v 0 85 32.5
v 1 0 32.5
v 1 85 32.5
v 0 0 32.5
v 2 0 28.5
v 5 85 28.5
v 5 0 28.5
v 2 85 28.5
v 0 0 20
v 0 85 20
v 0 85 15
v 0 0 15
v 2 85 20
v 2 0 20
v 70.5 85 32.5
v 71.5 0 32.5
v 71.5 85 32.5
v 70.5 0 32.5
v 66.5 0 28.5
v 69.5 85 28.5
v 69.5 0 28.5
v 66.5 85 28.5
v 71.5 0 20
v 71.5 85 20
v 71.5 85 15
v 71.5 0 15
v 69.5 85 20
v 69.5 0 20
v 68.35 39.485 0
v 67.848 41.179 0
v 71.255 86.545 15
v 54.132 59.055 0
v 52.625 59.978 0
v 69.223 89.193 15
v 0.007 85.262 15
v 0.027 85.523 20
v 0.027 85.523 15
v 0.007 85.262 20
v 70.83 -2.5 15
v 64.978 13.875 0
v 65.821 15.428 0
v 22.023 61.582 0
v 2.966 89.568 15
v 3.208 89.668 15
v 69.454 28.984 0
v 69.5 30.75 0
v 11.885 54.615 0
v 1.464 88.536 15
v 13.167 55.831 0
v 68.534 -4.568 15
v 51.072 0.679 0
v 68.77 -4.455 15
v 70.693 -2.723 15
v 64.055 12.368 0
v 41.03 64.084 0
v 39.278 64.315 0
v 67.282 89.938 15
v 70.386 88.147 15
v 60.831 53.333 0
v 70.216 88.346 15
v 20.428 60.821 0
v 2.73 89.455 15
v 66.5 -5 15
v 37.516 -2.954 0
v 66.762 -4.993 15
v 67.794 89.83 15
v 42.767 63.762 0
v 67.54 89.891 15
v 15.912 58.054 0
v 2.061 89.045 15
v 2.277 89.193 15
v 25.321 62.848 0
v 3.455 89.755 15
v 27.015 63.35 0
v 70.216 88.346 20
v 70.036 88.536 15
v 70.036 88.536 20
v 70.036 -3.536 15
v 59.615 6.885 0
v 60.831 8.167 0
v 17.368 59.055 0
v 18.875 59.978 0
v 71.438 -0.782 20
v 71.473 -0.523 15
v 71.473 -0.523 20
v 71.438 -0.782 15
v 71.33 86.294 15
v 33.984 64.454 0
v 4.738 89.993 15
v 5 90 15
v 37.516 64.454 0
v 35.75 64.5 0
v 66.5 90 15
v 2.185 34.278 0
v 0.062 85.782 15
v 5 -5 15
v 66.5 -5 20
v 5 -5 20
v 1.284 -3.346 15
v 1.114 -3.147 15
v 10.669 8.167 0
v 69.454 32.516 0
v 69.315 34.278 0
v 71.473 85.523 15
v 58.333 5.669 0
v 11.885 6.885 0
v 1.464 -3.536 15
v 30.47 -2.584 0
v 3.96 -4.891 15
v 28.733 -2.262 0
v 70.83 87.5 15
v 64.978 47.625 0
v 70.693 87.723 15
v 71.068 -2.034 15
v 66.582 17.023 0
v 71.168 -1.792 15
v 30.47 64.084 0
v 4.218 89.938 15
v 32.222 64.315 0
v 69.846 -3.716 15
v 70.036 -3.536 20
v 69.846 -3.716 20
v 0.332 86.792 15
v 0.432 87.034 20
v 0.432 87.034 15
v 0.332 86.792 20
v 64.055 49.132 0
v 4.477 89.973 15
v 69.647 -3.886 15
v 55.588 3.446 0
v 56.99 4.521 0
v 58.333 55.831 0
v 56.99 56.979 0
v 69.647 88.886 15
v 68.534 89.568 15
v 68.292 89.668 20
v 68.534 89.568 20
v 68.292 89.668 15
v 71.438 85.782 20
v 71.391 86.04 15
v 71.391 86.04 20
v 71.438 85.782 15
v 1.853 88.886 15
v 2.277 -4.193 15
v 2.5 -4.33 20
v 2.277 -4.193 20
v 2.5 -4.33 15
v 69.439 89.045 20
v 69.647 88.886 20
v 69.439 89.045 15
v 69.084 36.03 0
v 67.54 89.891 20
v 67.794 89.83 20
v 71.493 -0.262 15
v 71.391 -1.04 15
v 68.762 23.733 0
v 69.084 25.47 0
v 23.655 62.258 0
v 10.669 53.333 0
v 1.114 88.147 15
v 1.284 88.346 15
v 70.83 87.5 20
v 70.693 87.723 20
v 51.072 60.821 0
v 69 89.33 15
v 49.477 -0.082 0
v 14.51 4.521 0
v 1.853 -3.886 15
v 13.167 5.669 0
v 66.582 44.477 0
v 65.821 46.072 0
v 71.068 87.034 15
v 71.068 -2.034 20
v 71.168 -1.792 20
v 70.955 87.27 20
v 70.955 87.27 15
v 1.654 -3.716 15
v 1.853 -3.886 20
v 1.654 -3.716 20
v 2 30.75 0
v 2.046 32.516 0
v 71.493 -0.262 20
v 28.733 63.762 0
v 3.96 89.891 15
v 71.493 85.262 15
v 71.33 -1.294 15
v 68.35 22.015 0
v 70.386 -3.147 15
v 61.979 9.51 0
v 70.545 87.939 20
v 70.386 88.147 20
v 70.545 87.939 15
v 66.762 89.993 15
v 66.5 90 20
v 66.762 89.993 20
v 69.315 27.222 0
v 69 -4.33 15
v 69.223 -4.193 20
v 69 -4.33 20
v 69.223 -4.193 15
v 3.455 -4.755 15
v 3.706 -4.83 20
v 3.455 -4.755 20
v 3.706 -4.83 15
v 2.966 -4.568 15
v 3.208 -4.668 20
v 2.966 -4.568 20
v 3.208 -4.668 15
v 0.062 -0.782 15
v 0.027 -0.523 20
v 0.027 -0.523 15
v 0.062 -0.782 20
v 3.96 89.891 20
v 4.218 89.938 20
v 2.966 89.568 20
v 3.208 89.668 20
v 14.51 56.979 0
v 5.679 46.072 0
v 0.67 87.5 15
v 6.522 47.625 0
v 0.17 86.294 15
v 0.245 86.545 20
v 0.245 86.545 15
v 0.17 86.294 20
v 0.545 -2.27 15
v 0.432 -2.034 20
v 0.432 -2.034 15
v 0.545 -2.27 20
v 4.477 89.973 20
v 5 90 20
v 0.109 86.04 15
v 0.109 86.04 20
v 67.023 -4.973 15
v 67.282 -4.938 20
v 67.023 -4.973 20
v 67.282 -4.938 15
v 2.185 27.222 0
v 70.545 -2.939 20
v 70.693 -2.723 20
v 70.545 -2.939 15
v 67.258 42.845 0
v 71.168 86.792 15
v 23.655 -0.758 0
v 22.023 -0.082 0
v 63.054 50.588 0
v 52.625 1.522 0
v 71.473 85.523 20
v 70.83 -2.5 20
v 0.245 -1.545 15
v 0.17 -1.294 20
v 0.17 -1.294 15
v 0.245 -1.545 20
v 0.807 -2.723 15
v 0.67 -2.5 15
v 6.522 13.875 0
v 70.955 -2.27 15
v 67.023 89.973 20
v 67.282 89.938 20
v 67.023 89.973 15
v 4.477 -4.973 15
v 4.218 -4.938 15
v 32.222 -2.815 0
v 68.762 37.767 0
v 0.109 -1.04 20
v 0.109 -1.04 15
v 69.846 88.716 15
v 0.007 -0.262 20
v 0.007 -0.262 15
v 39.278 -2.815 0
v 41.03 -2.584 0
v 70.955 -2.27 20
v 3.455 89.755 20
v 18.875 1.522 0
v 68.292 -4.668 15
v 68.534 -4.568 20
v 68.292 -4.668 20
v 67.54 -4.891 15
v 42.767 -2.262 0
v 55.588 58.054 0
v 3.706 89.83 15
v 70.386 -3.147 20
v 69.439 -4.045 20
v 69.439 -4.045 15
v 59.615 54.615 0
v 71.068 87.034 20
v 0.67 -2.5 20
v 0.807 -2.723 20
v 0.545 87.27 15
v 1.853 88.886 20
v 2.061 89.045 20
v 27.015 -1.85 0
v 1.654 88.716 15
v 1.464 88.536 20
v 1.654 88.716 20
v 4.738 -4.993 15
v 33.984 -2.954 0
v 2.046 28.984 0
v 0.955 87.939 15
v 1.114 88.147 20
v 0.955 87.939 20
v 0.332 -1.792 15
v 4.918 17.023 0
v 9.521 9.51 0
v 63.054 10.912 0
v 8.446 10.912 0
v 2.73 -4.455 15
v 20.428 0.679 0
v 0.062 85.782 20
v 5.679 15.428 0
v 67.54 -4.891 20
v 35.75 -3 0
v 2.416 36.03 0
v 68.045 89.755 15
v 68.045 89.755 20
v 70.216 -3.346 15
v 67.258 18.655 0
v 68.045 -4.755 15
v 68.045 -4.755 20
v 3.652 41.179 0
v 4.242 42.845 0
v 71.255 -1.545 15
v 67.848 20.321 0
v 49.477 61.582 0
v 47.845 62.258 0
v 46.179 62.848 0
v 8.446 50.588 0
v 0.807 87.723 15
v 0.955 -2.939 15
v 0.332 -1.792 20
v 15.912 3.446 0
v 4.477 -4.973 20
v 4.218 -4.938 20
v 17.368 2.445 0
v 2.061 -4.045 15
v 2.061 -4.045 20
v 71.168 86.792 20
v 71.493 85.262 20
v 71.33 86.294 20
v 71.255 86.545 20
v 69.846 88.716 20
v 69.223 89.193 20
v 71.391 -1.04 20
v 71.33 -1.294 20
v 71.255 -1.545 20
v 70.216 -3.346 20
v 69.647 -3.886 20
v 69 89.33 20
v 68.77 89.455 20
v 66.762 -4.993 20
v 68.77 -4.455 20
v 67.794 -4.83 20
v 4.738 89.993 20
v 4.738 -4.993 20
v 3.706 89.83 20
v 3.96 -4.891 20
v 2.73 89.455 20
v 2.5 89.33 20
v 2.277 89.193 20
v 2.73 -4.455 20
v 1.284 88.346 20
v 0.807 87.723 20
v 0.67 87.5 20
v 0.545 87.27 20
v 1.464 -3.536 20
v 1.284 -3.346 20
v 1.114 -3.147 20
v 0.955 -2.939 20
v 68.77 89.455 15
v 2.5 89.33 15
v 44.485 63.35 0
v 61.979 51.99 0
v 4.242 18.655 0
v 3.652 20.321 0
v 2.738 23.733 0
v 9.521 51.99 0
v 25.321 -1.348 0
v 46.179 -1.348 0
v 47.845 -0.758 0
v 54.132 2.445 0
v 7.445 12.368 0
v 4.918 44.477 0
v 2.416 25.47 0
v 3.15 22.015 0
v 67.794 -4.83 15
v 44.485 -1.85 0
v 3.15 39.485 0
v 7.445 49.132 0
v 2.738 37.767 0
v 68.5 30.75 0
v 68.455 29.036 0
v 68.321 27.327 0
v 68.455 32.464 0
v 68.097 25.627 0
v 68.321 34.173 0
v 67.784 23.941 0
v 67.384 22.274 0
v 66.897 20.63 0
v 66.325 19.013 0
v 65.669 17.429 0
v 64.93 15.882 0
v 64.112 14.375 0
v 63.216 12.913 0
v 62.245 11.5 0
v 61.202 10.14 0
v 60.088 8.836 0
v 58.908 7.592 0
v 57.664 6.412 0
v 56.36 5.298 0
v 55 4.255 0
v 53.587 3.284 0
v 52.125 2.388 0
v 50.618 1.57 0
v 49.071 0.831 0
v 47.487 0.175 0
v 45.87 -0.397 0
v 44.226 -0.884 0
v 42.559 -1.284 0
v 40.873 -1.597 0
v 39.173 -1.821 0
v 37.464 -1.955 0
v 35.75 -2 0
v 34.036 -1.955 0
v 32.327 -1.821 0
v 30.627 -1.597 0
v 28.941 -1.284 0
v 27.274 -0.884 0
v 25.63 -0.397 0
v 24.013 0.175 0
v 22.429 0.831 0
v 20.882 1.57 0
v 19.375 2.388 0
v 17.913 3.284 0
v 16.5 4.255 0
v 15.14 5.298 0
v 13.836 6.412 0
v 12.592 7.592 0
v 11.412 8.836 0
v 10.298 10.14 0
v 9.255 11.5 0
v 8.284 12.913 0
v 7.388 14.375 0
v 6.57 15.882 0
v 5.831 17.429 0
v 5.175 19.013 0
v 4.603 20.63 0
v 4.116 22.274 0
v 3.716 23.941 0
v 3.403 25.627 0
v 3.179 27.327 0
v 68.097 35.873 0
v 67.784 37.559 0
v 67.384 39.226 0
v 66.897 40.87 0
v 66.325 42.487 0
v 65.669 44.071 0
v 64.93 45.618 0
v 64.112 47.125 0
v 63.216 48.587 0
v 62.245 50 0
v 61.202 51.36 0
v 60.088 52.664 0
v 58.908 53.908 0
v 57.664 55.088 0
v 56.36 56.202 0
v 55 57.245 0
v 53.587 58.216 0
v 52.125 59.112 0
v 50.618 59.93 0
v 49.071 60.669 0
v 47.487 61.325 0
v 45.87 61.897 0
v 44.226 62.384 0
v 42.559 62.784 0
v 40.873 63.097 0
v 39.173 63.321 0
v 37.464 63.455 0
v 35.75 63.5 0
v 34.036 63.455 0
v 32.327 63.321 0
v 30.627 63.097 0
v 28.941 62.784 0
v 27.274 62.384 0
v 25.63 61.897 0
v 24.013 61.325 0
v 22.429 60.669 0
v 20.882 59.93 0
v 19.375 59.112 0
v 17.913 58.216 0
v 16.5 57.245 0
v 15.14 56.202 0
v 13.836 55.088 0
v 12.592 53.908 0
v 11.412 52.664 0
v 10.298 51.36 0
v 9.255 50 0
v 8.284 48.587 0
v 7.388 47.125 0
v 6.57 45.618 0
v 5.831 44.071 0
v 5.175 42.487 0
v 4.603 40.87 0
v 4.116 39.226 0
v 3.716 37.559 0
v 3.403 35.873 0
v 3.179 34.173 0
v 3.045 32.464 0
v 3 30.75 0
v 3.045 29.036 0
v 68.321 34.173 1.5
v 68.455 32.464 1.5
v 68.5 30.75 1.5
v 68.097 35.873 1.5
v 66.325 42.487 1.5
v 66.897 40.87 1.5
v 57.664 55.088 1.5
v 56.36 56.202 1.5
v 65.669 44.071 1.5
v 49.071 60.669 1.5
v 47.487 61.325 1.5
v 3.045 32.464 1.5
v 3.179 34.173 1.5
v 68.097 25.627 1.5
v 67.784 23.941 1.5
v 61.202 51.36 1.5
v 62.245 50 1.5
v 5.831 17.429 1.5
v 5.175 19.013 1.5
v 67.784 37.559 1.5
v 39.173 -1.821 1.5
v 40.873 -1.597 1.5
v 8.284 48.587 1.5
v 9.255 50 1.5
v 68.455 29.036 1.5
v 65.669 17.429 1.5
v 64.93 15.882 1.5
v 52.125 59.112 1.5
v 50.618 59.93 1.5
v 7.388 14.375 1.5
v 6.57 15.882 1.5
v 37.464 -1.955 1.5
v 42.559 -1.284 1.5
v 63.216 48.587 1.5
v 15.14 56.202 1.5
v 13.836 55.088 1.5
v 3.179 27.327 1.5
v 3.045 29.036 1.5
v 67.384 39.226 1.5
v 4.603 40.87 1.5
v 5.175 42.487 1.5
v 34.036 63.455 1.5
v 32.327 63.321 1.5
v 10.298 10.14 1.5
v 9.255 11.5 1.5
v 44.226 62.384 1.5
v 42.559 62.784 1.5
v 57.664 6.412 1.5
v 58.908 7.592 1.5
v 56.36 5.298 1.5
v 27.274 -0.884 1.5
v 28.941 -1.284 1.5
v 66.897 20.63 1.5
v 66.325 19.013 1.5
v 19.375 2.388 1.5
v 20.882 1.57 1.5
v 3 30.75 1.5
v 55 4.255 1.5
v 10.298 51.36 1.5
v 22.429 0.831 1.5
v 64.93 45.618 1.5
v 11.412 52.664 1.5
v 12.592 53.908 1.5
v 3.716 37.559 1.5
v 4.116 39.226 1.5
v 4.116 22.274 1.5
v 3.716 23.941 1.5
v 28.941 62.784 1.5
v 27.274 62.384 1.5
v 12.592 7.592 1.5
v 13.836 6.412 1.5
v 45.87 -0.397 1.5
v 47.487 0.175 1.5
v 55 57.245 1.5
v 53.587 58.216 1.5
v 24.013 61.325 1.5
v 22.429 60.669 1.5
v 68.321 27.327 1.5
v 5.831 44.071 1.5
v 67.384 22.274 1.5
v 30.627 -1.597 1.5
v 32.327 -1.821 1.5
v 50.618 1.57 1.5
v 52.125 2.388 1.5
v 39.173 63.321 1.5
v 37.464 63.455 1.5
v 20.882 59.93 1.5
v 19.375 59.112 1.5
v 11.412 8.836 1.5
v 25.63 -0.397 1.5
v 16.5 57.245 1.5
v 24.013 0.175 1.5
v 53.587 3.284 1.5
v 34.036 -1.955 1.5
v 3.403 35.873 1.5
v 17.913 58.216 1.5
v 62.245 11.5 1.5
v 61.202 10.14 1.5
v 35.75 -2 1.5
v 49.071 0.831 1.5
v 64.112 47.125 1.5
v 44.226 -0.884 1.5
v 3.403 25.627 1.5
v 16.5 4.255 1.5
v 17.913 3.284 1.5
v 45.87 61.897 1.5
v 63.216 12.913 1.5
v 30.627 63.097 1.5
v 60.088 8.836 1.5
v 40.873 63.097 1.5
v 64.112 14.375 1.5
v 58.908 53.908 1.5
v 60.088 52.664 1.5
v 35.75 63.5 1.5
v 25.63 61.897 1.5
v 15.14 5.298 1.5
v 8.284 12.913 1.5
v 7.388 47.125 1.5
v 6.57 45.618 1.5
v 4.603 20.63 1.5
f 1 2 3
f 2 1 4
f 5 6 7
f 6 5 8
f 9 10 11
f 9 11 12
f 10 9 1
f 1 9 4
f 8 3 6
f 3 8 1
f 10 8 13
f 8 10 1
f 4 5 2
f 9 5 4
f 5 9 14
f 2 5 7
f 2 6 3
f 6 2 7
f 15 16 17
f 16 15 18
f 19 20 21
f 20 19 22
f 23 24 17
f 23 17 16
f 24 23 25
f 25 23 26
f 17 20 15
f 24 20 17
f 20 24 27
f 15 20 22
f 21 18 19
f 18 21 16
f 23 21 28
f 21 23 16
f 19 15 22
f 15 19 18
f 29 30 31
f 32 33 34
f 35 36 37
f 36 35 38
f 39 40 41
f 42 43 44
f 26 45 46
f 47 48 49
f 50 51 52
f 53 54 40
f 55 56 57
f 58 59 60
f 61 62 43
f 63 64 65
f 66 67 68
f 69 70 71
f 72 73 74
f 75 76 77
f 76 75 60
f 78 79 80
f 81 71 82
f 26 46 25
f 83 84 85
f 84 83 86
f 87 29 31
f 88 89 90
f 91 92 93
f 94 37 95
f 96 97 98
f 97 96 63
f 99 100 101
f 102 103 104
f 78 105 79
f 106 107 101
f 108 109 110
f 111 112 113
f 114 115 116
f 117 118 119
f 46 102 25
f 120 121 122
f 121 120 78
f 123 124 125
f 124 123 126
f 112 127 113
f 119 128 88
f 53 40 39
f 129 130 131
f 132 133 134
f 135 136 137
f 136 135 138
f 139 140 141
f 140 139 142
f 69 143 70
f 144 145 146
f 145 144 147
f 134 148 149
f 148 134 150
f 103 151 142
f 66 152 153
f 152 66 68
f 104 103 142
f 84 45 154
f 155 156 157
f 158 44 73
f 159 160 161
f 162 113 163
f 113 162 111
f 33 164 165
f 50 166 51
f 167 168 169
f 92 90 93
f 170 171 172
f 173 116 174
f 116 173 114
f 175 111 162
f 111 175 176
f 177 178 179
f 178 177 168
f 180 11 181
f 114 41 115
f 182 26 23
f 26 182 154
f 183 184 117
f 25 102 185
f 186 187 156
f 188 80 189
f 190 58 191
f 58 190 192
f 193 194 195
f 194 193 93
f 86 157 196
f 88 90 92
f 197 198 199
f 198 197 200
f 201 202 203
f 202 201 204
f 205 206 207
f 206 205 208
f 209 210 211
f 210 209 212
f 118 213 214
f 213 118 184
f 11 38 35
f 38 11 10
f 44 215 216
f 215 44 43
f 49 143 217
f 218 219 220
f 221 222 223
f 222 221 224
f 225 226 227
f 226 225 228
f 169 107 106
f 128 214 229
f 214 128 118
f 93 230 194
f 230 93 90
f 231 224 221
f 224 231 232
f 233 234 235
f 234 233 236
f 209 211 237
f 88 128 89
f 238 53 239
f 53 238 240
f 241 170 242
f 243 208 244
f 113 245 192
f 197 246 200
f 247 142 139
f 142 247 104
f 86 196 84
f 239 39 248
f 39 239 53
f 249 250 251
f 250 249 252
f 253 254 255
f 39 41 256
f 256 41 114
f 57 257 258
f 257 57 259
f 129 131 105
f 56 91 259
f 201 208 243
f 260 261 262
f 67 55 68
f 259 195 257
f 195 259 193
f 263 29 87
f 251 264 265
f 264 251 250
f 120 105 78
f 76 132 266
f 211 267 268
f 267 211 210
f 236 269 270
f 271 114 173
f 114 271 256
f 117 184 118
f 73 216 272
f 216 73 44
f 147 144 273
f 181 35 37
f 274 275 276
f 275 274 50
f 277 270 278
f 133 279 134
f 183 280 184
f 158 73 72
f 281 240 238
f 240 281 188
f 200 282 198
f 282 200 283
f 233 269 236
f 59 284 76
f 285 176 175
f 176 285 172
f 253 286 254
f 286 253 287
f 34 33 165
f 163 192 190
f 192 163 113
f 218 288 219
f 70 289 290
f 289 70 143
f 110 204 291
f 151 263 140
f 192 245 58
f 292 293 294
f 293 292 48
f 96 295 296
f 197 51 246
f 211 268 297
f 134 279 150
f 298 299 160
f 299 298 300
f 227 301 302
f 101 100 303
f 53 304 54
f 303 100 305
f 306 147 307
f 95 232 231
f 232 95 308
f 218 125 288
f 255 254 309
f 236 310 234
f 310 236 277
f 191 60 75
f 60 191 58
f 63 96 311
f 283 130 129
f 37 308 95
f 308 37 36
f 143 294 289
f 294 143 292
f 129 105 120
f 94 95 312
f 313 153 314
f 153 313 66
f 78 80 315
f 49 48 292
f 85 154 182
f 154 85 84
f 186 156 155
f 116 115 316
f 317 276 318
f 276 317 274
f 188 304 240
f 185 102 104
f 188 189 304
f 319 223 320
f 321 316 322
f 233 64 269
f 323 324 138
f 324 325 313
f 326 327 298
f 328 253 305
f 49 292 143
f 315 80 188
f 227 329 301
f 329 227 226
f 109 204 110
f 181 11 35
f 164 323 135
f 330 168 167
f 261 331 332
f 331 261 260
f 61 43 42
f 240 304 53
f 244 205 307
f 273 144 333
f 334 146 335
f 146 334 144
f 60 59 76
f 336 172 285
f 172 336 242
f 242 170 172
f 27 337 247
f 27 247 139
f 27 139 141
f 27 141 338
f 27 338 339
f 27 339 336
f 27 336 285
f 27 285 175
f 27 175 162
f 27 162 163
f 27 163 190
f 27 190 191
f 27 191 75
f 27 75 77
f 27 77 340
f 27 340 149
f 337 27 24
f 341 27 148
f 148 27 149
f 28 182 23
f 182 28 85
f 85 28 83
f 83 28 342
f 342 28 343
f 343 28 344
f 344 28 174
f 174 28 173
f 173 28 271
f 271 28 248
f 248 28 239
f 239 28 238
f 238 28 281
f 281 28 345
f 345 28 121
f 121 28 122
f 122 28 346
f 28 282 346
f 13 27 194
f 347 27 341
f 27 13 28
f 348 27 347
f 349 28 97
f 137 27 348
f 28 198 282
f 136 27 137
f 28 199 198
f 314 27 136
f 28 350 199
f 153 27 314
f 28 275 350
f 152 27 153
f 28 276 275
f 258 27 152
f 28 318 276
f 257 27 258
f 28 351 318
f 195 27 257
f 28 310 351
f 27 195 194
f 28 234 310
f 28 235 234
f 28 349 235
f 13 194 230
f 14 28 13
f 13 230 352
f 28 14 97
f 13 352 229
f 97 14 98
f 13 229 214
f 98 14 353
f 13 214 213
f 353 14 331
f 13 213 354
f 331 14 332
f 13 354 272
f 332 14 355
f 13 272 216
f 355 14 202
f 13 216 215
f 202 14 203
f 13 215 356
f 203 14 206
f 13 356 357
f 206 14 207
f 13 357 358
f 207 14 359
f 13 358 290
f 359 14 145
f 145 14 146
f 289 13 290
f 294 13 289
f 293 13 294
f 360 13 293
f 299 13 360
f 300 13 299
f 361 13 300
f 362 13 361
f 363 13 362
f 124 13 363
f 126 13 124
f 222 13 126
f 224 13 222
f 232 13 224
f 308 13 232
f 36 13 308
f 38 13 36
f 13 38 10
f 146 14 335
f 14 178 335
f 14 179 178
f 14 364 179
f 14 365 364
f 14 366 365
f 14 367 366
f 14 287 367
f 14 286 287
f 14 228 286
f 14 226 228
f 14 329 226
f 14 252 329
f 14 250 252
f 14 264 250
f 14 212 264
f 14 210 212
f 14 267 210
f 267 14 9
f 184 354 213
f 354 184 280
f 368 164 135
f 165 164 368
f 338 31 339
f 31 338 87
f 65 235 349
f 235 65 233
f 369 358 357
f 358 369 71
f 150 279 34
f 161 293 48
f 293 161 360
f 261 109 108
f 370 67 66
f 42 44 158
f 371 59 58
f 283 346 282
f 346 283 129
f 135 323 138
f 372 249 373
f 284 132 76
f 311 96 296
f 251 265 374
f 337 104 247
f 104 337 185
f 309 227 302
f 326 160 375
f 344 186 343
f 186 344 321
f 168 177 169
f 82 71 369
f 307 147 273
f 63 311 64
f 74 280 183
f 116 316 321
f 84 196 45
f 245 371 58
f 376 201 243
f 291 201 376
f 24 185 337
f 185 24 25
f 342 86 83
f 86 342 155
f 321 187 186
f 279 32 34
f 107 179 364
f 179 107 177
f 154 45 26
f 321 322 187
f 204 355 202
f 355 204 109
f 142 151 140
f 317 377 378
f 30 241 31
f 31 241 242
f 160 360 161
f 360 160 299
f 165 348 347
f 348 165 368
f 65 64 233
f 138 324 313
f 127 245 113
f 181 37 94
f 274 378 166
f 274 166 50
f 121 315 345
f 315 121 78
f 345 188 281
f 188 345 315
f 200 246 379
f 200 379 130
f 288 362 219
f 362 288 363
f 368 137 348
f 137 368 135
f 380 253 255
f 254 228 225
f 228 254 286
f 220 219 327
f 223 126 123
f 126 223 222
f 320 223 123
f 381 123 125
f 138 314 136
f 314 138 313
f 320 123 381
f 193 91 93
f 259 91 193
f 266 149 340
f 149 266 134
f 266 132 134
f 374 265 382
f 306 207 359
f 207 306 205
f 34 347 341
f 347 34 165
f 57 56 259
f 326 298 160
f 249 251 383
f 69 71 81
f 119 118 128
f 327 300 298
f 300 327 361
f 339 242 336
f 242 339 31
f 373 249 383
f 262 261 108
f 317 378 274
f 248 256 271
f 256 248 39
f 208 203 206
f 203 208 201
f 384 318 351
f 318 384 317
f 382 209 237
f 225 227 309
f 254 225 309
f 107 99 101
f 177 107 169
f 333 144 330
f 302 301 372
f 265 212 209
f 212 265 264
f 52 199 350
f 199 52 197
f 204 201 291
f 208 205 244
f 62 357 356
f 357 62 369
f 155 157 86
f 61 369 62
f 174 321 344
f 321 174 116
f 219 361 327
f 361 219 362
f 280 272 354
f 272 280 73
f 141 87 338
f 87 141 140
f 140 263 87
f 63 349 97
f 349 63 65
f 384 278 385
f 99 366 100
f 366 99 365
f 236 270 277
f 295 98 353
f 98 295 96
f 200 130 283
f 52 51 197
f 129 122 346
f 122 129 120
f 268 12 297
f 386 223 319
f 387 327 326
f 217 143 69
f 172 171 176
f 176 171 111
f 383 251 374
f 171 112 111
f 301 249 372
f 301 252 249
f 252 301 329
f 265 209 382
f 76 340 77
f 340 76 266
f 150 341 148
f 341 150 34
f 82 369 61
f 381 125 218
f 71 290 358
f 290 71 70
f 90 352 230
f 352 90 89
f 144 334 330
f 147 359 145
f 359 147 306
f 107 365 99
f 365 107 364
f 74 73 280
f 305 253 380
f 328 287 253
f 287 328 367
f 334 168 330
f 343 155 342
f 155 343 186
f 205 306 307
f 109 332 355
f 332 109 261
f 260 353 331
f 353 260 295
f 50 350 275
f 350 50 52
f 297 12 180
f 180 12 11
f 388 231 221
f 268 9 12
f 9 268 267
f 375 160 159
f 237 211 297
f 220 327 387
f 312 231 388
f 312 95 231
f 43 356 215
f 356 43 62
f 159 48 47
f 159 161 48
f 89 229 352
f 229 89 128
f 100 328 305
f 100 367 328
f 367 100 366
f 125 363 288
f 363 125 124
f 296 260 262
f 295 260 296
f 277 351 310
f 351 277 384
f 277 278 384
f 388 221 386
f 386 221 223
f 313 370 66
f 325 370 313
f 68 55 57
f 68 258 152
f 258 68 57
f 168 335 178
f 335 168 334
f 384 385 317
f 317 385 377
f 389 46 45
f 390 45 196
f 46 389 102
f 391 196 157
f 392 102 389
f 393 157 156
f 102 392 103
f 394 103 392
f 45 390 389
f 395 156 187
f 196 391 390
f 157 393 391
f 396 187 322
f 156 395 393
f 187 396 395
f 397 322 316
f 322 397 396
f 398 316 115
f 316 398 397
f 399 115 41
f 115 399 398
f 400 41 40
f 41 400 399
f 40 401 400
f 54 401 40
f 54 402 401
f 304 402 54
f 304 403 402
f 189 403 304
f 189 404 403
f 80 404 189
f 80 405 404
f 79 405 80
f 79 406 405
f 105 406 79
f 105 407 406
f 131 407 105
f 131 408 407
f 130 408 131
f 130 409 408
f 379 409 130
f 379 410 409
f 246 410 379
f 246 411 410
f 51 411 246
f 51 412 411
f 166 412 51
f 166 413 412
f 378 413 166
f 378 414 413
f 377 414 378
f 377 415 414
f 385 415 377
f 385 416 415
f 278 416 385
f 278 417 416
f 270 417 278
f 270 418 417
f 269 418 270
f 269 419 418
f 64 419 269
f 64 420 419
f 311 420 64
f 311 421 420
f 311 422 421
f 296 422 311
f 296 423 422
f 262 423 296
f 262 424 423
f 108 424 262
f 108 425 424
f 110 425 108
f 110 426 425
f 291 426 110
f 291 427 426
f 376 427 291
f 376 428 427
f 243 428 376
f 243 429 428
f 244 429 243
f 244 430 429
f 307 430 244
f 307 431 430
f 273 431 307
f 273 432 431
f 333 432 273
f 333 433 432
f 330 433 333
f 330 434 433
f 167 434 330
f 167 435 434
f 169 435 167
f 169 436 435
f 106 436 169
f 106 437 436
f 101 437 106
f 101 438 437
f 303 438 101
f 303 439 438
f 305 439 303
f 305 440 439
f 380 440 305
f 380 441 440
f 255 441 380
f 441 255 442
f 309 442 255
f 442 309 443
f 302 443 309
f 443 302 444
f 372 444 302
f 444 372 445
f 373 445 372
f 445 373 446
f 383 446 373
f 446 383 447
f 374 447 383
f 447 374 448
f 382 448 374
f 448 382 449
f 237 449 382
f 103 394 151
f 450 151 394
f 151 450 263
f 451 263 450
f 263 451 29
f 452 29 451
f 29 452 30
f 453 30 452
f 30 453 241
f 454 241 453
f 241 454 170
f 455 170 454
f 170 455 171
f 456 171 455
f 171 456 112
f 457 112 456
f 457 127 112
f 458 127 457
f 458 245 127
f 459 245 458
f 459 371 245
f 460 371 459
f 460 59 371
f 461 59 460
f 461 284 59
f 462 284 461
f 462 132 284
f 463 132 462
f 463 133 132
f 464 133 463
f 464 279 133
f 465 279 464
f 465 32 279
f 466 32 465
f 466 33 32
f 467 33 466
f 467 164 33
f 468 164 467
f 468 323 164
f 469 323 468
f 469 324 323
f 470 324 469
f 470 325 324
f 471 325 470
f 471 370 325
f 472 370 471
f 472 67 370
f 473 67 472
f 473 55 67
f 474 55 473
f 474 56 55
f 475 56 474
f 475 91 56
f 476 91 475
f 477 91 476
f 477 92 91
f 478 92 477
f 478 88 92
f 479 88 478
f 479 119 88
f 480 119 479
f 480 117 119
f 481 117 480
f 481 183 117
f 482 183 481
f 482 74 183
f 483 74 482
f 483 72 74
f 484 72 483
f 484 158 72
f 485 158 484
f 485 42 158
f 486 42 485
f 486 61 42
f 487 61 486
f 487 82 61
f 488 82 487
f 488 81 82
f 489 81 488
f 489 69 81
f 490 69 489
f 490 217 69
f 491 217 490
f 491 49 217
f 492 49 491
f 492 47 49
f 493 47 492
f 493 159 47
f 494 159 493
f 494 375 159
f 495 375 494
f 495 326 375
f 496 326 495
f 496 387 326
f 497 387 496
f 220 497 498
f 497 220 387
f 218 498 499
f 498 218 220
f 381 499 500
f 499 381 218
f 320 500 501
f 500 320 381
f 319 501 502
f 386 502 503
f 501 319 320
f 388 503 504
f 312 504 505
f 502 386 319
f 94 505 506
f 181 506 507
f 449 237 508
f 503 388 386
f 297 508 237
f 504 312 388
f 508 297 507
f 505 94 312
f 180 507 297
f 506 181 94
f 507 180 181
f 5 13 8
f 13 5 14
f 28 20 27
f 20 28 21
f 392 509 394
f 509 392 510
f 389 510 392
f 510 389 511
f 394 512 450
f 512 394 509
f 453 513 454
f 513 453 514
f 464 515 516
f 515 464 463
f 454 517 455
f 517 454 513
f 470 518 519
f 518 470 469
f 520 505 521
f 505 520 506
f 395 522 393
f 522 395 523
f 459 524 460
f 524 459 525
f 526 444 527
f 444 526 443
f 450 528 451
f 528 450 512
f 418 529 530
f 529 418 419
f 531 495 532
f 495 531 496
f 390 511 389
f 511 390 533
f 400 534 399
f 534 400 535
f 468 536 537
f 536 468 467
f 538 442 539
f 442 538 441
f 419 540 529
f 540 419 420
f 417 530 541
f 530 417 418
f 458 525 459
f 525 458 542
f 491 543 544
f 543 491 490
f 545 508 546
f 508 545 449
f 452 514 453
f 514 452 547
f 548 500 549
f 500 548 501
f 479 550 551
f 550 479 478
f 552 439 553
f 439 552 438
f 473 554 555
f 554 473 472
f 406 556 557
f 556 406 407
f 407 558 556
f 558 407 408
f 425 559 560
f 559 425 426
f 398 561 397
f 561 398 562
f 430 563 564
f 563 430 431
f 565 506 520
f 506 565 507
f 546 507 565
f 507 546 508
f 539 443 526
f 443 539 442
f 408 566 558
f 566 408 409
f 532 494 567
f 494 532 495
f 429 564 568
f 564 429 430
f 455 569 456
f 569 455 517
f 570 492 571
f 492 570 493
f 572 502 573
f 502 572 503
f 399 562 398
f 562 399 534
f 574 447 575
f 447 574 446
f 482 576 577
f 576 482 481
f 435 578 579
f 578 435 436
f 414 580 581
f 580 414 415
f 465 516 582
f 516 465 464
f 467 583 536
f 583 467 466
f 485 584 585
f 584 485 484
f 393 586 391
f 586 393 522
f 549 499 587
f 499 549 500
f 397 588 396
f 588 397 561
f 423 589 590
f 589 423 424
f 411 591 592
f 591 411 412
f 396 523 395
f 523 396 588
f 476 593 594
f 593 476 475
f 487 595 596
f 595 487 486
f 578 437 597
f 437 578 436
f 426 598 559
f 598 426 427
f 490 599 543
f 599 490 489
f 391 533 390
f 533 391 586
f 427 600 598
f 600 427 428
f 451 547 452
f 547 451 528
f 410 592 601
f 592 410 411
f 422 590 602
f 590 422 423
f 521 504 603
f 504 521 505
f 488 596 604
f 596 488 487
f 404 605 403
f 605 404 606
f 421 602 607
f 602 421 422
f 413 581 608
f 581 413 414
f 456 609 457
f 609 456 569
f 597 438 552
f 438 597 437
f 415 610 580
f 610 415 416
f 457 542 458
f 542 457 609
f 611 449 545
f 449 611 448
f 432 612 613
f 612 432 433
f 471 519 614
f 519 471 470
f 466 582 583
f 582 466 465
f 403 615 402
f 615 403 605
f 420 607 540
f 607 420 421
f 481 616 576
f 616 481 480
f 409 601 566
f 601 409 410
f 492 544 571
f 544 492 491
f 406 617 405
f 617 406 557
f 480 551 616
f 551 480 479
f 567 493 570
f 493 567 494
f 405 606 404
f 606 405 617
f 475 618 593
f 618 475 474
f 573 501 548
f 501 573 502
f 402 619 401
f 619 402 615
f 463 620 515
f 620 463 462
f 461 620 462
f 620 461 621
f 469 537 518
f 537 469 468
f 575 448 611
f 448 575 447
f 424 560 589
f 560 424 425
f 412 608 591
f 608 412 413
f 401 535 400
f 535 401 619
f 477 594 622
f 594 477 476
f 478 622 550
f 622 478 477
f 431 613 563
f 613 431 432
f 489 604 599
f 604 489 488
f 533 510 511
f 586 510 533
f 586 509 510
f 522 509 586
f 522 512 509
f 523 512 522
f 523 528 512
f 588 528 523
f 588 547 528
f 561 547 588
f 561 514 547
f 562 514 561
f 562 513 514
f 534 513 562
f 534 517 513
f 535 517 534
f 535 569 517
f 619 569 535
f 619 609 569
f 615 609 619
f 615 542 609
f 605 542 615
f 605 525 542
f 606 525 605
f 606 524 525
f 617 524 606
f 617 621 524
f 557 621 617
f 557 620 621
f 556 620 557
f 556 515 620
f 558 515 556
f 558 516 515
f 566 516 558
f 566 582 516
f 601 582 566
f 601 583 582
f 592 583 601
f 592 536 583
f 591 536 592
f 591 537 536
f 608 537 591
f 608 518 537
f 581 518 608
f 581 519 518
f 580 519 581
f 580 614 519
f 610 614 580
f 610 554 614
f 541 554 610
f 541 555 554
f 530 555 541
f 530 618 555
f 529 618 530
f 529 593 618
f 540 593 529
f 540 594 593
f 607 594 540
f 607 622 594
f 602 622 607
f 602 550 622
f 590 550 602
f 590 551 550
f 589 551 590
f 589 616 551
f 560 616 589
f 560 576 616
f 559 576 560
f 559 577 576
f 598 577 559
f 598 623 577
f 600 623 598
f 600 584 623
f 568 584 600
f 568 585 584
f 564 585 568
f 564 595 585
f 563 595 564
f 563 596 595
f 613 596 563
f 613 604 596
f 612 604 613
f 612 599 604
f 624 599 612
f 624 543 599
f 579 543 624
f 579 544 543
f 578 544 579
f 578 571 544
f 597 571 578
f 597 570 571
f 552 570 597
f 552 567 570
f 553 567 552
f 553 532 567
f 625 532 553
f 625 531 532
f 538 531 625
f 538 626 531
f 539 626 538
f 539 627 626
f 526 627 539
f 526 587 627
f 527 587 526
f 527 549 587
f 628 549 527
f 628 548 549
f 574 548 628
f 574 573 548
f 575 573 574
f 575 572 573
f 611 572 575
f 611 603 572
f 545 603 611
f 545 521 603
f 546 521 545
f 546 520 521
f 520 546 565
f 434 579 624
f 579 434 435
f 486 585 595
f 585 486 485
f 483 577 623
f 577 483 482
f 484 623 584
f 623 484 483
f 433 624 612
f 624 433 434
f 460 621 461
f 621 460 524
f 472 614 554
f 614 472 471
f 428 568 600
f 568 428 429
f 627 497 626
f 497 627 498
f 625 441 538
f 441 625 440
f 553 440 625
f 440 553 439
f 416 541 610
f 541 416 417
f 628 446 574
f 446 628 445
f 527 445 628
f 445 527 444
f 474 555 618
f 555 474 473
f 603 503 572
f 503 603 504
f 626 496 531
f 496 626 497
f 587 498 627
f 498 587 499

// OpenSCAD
$fn=120;
metal_x=67.5;
metal_y=85;
metal_z=8.5;

corner=10;

wall=2;
clip=3;
clip_h=4;

total_x=metal_x+wall*2;


h=20;
base_h=5;
hull_h=h-base_h;

felt=2.5*25.4+2;
felt_h=1.5;
felt_wall=1;

pad=0.1;
padd=pad*2;


difference() {
    union() {
        hull() {
            translate([h/4,0,hull_h])
            minkowski() {
                cylinder(h=base_h/2,d=corner);
                cube([total_x-h/2,metal_y,base_h/2]);
            }
            translate([total_x/2,total_x/2-corner/2,0])
            cylinder(d=felt+felt_wall*2,h=hull_h);
        }

        translate([0,0,h])
        cube([wall,metal_y,metal_z]);
        translate([total_x-wall,0,h])
        cube([wall,metal_y,metal_z]);
        clip();
        translate([total_x,0,0])
        mirror([1,0,0])
        clip();
    }
    translate([total_x/2,total_x/2-corner/2,-pad])
    cylinder(h=felt_h+pad,d=felt);
}

module clip() {
    difference() {
        translate([0,0,metal_z+h])
        cube([wall+clip,metal_y,clip_h]);
        translate([wall+clip,-pad,metal_z+h])
        rotate([0,-45,0])
        cube([(wall+clip)*2,metal_y+padd,(clip+wall)*2]);
    }
}
